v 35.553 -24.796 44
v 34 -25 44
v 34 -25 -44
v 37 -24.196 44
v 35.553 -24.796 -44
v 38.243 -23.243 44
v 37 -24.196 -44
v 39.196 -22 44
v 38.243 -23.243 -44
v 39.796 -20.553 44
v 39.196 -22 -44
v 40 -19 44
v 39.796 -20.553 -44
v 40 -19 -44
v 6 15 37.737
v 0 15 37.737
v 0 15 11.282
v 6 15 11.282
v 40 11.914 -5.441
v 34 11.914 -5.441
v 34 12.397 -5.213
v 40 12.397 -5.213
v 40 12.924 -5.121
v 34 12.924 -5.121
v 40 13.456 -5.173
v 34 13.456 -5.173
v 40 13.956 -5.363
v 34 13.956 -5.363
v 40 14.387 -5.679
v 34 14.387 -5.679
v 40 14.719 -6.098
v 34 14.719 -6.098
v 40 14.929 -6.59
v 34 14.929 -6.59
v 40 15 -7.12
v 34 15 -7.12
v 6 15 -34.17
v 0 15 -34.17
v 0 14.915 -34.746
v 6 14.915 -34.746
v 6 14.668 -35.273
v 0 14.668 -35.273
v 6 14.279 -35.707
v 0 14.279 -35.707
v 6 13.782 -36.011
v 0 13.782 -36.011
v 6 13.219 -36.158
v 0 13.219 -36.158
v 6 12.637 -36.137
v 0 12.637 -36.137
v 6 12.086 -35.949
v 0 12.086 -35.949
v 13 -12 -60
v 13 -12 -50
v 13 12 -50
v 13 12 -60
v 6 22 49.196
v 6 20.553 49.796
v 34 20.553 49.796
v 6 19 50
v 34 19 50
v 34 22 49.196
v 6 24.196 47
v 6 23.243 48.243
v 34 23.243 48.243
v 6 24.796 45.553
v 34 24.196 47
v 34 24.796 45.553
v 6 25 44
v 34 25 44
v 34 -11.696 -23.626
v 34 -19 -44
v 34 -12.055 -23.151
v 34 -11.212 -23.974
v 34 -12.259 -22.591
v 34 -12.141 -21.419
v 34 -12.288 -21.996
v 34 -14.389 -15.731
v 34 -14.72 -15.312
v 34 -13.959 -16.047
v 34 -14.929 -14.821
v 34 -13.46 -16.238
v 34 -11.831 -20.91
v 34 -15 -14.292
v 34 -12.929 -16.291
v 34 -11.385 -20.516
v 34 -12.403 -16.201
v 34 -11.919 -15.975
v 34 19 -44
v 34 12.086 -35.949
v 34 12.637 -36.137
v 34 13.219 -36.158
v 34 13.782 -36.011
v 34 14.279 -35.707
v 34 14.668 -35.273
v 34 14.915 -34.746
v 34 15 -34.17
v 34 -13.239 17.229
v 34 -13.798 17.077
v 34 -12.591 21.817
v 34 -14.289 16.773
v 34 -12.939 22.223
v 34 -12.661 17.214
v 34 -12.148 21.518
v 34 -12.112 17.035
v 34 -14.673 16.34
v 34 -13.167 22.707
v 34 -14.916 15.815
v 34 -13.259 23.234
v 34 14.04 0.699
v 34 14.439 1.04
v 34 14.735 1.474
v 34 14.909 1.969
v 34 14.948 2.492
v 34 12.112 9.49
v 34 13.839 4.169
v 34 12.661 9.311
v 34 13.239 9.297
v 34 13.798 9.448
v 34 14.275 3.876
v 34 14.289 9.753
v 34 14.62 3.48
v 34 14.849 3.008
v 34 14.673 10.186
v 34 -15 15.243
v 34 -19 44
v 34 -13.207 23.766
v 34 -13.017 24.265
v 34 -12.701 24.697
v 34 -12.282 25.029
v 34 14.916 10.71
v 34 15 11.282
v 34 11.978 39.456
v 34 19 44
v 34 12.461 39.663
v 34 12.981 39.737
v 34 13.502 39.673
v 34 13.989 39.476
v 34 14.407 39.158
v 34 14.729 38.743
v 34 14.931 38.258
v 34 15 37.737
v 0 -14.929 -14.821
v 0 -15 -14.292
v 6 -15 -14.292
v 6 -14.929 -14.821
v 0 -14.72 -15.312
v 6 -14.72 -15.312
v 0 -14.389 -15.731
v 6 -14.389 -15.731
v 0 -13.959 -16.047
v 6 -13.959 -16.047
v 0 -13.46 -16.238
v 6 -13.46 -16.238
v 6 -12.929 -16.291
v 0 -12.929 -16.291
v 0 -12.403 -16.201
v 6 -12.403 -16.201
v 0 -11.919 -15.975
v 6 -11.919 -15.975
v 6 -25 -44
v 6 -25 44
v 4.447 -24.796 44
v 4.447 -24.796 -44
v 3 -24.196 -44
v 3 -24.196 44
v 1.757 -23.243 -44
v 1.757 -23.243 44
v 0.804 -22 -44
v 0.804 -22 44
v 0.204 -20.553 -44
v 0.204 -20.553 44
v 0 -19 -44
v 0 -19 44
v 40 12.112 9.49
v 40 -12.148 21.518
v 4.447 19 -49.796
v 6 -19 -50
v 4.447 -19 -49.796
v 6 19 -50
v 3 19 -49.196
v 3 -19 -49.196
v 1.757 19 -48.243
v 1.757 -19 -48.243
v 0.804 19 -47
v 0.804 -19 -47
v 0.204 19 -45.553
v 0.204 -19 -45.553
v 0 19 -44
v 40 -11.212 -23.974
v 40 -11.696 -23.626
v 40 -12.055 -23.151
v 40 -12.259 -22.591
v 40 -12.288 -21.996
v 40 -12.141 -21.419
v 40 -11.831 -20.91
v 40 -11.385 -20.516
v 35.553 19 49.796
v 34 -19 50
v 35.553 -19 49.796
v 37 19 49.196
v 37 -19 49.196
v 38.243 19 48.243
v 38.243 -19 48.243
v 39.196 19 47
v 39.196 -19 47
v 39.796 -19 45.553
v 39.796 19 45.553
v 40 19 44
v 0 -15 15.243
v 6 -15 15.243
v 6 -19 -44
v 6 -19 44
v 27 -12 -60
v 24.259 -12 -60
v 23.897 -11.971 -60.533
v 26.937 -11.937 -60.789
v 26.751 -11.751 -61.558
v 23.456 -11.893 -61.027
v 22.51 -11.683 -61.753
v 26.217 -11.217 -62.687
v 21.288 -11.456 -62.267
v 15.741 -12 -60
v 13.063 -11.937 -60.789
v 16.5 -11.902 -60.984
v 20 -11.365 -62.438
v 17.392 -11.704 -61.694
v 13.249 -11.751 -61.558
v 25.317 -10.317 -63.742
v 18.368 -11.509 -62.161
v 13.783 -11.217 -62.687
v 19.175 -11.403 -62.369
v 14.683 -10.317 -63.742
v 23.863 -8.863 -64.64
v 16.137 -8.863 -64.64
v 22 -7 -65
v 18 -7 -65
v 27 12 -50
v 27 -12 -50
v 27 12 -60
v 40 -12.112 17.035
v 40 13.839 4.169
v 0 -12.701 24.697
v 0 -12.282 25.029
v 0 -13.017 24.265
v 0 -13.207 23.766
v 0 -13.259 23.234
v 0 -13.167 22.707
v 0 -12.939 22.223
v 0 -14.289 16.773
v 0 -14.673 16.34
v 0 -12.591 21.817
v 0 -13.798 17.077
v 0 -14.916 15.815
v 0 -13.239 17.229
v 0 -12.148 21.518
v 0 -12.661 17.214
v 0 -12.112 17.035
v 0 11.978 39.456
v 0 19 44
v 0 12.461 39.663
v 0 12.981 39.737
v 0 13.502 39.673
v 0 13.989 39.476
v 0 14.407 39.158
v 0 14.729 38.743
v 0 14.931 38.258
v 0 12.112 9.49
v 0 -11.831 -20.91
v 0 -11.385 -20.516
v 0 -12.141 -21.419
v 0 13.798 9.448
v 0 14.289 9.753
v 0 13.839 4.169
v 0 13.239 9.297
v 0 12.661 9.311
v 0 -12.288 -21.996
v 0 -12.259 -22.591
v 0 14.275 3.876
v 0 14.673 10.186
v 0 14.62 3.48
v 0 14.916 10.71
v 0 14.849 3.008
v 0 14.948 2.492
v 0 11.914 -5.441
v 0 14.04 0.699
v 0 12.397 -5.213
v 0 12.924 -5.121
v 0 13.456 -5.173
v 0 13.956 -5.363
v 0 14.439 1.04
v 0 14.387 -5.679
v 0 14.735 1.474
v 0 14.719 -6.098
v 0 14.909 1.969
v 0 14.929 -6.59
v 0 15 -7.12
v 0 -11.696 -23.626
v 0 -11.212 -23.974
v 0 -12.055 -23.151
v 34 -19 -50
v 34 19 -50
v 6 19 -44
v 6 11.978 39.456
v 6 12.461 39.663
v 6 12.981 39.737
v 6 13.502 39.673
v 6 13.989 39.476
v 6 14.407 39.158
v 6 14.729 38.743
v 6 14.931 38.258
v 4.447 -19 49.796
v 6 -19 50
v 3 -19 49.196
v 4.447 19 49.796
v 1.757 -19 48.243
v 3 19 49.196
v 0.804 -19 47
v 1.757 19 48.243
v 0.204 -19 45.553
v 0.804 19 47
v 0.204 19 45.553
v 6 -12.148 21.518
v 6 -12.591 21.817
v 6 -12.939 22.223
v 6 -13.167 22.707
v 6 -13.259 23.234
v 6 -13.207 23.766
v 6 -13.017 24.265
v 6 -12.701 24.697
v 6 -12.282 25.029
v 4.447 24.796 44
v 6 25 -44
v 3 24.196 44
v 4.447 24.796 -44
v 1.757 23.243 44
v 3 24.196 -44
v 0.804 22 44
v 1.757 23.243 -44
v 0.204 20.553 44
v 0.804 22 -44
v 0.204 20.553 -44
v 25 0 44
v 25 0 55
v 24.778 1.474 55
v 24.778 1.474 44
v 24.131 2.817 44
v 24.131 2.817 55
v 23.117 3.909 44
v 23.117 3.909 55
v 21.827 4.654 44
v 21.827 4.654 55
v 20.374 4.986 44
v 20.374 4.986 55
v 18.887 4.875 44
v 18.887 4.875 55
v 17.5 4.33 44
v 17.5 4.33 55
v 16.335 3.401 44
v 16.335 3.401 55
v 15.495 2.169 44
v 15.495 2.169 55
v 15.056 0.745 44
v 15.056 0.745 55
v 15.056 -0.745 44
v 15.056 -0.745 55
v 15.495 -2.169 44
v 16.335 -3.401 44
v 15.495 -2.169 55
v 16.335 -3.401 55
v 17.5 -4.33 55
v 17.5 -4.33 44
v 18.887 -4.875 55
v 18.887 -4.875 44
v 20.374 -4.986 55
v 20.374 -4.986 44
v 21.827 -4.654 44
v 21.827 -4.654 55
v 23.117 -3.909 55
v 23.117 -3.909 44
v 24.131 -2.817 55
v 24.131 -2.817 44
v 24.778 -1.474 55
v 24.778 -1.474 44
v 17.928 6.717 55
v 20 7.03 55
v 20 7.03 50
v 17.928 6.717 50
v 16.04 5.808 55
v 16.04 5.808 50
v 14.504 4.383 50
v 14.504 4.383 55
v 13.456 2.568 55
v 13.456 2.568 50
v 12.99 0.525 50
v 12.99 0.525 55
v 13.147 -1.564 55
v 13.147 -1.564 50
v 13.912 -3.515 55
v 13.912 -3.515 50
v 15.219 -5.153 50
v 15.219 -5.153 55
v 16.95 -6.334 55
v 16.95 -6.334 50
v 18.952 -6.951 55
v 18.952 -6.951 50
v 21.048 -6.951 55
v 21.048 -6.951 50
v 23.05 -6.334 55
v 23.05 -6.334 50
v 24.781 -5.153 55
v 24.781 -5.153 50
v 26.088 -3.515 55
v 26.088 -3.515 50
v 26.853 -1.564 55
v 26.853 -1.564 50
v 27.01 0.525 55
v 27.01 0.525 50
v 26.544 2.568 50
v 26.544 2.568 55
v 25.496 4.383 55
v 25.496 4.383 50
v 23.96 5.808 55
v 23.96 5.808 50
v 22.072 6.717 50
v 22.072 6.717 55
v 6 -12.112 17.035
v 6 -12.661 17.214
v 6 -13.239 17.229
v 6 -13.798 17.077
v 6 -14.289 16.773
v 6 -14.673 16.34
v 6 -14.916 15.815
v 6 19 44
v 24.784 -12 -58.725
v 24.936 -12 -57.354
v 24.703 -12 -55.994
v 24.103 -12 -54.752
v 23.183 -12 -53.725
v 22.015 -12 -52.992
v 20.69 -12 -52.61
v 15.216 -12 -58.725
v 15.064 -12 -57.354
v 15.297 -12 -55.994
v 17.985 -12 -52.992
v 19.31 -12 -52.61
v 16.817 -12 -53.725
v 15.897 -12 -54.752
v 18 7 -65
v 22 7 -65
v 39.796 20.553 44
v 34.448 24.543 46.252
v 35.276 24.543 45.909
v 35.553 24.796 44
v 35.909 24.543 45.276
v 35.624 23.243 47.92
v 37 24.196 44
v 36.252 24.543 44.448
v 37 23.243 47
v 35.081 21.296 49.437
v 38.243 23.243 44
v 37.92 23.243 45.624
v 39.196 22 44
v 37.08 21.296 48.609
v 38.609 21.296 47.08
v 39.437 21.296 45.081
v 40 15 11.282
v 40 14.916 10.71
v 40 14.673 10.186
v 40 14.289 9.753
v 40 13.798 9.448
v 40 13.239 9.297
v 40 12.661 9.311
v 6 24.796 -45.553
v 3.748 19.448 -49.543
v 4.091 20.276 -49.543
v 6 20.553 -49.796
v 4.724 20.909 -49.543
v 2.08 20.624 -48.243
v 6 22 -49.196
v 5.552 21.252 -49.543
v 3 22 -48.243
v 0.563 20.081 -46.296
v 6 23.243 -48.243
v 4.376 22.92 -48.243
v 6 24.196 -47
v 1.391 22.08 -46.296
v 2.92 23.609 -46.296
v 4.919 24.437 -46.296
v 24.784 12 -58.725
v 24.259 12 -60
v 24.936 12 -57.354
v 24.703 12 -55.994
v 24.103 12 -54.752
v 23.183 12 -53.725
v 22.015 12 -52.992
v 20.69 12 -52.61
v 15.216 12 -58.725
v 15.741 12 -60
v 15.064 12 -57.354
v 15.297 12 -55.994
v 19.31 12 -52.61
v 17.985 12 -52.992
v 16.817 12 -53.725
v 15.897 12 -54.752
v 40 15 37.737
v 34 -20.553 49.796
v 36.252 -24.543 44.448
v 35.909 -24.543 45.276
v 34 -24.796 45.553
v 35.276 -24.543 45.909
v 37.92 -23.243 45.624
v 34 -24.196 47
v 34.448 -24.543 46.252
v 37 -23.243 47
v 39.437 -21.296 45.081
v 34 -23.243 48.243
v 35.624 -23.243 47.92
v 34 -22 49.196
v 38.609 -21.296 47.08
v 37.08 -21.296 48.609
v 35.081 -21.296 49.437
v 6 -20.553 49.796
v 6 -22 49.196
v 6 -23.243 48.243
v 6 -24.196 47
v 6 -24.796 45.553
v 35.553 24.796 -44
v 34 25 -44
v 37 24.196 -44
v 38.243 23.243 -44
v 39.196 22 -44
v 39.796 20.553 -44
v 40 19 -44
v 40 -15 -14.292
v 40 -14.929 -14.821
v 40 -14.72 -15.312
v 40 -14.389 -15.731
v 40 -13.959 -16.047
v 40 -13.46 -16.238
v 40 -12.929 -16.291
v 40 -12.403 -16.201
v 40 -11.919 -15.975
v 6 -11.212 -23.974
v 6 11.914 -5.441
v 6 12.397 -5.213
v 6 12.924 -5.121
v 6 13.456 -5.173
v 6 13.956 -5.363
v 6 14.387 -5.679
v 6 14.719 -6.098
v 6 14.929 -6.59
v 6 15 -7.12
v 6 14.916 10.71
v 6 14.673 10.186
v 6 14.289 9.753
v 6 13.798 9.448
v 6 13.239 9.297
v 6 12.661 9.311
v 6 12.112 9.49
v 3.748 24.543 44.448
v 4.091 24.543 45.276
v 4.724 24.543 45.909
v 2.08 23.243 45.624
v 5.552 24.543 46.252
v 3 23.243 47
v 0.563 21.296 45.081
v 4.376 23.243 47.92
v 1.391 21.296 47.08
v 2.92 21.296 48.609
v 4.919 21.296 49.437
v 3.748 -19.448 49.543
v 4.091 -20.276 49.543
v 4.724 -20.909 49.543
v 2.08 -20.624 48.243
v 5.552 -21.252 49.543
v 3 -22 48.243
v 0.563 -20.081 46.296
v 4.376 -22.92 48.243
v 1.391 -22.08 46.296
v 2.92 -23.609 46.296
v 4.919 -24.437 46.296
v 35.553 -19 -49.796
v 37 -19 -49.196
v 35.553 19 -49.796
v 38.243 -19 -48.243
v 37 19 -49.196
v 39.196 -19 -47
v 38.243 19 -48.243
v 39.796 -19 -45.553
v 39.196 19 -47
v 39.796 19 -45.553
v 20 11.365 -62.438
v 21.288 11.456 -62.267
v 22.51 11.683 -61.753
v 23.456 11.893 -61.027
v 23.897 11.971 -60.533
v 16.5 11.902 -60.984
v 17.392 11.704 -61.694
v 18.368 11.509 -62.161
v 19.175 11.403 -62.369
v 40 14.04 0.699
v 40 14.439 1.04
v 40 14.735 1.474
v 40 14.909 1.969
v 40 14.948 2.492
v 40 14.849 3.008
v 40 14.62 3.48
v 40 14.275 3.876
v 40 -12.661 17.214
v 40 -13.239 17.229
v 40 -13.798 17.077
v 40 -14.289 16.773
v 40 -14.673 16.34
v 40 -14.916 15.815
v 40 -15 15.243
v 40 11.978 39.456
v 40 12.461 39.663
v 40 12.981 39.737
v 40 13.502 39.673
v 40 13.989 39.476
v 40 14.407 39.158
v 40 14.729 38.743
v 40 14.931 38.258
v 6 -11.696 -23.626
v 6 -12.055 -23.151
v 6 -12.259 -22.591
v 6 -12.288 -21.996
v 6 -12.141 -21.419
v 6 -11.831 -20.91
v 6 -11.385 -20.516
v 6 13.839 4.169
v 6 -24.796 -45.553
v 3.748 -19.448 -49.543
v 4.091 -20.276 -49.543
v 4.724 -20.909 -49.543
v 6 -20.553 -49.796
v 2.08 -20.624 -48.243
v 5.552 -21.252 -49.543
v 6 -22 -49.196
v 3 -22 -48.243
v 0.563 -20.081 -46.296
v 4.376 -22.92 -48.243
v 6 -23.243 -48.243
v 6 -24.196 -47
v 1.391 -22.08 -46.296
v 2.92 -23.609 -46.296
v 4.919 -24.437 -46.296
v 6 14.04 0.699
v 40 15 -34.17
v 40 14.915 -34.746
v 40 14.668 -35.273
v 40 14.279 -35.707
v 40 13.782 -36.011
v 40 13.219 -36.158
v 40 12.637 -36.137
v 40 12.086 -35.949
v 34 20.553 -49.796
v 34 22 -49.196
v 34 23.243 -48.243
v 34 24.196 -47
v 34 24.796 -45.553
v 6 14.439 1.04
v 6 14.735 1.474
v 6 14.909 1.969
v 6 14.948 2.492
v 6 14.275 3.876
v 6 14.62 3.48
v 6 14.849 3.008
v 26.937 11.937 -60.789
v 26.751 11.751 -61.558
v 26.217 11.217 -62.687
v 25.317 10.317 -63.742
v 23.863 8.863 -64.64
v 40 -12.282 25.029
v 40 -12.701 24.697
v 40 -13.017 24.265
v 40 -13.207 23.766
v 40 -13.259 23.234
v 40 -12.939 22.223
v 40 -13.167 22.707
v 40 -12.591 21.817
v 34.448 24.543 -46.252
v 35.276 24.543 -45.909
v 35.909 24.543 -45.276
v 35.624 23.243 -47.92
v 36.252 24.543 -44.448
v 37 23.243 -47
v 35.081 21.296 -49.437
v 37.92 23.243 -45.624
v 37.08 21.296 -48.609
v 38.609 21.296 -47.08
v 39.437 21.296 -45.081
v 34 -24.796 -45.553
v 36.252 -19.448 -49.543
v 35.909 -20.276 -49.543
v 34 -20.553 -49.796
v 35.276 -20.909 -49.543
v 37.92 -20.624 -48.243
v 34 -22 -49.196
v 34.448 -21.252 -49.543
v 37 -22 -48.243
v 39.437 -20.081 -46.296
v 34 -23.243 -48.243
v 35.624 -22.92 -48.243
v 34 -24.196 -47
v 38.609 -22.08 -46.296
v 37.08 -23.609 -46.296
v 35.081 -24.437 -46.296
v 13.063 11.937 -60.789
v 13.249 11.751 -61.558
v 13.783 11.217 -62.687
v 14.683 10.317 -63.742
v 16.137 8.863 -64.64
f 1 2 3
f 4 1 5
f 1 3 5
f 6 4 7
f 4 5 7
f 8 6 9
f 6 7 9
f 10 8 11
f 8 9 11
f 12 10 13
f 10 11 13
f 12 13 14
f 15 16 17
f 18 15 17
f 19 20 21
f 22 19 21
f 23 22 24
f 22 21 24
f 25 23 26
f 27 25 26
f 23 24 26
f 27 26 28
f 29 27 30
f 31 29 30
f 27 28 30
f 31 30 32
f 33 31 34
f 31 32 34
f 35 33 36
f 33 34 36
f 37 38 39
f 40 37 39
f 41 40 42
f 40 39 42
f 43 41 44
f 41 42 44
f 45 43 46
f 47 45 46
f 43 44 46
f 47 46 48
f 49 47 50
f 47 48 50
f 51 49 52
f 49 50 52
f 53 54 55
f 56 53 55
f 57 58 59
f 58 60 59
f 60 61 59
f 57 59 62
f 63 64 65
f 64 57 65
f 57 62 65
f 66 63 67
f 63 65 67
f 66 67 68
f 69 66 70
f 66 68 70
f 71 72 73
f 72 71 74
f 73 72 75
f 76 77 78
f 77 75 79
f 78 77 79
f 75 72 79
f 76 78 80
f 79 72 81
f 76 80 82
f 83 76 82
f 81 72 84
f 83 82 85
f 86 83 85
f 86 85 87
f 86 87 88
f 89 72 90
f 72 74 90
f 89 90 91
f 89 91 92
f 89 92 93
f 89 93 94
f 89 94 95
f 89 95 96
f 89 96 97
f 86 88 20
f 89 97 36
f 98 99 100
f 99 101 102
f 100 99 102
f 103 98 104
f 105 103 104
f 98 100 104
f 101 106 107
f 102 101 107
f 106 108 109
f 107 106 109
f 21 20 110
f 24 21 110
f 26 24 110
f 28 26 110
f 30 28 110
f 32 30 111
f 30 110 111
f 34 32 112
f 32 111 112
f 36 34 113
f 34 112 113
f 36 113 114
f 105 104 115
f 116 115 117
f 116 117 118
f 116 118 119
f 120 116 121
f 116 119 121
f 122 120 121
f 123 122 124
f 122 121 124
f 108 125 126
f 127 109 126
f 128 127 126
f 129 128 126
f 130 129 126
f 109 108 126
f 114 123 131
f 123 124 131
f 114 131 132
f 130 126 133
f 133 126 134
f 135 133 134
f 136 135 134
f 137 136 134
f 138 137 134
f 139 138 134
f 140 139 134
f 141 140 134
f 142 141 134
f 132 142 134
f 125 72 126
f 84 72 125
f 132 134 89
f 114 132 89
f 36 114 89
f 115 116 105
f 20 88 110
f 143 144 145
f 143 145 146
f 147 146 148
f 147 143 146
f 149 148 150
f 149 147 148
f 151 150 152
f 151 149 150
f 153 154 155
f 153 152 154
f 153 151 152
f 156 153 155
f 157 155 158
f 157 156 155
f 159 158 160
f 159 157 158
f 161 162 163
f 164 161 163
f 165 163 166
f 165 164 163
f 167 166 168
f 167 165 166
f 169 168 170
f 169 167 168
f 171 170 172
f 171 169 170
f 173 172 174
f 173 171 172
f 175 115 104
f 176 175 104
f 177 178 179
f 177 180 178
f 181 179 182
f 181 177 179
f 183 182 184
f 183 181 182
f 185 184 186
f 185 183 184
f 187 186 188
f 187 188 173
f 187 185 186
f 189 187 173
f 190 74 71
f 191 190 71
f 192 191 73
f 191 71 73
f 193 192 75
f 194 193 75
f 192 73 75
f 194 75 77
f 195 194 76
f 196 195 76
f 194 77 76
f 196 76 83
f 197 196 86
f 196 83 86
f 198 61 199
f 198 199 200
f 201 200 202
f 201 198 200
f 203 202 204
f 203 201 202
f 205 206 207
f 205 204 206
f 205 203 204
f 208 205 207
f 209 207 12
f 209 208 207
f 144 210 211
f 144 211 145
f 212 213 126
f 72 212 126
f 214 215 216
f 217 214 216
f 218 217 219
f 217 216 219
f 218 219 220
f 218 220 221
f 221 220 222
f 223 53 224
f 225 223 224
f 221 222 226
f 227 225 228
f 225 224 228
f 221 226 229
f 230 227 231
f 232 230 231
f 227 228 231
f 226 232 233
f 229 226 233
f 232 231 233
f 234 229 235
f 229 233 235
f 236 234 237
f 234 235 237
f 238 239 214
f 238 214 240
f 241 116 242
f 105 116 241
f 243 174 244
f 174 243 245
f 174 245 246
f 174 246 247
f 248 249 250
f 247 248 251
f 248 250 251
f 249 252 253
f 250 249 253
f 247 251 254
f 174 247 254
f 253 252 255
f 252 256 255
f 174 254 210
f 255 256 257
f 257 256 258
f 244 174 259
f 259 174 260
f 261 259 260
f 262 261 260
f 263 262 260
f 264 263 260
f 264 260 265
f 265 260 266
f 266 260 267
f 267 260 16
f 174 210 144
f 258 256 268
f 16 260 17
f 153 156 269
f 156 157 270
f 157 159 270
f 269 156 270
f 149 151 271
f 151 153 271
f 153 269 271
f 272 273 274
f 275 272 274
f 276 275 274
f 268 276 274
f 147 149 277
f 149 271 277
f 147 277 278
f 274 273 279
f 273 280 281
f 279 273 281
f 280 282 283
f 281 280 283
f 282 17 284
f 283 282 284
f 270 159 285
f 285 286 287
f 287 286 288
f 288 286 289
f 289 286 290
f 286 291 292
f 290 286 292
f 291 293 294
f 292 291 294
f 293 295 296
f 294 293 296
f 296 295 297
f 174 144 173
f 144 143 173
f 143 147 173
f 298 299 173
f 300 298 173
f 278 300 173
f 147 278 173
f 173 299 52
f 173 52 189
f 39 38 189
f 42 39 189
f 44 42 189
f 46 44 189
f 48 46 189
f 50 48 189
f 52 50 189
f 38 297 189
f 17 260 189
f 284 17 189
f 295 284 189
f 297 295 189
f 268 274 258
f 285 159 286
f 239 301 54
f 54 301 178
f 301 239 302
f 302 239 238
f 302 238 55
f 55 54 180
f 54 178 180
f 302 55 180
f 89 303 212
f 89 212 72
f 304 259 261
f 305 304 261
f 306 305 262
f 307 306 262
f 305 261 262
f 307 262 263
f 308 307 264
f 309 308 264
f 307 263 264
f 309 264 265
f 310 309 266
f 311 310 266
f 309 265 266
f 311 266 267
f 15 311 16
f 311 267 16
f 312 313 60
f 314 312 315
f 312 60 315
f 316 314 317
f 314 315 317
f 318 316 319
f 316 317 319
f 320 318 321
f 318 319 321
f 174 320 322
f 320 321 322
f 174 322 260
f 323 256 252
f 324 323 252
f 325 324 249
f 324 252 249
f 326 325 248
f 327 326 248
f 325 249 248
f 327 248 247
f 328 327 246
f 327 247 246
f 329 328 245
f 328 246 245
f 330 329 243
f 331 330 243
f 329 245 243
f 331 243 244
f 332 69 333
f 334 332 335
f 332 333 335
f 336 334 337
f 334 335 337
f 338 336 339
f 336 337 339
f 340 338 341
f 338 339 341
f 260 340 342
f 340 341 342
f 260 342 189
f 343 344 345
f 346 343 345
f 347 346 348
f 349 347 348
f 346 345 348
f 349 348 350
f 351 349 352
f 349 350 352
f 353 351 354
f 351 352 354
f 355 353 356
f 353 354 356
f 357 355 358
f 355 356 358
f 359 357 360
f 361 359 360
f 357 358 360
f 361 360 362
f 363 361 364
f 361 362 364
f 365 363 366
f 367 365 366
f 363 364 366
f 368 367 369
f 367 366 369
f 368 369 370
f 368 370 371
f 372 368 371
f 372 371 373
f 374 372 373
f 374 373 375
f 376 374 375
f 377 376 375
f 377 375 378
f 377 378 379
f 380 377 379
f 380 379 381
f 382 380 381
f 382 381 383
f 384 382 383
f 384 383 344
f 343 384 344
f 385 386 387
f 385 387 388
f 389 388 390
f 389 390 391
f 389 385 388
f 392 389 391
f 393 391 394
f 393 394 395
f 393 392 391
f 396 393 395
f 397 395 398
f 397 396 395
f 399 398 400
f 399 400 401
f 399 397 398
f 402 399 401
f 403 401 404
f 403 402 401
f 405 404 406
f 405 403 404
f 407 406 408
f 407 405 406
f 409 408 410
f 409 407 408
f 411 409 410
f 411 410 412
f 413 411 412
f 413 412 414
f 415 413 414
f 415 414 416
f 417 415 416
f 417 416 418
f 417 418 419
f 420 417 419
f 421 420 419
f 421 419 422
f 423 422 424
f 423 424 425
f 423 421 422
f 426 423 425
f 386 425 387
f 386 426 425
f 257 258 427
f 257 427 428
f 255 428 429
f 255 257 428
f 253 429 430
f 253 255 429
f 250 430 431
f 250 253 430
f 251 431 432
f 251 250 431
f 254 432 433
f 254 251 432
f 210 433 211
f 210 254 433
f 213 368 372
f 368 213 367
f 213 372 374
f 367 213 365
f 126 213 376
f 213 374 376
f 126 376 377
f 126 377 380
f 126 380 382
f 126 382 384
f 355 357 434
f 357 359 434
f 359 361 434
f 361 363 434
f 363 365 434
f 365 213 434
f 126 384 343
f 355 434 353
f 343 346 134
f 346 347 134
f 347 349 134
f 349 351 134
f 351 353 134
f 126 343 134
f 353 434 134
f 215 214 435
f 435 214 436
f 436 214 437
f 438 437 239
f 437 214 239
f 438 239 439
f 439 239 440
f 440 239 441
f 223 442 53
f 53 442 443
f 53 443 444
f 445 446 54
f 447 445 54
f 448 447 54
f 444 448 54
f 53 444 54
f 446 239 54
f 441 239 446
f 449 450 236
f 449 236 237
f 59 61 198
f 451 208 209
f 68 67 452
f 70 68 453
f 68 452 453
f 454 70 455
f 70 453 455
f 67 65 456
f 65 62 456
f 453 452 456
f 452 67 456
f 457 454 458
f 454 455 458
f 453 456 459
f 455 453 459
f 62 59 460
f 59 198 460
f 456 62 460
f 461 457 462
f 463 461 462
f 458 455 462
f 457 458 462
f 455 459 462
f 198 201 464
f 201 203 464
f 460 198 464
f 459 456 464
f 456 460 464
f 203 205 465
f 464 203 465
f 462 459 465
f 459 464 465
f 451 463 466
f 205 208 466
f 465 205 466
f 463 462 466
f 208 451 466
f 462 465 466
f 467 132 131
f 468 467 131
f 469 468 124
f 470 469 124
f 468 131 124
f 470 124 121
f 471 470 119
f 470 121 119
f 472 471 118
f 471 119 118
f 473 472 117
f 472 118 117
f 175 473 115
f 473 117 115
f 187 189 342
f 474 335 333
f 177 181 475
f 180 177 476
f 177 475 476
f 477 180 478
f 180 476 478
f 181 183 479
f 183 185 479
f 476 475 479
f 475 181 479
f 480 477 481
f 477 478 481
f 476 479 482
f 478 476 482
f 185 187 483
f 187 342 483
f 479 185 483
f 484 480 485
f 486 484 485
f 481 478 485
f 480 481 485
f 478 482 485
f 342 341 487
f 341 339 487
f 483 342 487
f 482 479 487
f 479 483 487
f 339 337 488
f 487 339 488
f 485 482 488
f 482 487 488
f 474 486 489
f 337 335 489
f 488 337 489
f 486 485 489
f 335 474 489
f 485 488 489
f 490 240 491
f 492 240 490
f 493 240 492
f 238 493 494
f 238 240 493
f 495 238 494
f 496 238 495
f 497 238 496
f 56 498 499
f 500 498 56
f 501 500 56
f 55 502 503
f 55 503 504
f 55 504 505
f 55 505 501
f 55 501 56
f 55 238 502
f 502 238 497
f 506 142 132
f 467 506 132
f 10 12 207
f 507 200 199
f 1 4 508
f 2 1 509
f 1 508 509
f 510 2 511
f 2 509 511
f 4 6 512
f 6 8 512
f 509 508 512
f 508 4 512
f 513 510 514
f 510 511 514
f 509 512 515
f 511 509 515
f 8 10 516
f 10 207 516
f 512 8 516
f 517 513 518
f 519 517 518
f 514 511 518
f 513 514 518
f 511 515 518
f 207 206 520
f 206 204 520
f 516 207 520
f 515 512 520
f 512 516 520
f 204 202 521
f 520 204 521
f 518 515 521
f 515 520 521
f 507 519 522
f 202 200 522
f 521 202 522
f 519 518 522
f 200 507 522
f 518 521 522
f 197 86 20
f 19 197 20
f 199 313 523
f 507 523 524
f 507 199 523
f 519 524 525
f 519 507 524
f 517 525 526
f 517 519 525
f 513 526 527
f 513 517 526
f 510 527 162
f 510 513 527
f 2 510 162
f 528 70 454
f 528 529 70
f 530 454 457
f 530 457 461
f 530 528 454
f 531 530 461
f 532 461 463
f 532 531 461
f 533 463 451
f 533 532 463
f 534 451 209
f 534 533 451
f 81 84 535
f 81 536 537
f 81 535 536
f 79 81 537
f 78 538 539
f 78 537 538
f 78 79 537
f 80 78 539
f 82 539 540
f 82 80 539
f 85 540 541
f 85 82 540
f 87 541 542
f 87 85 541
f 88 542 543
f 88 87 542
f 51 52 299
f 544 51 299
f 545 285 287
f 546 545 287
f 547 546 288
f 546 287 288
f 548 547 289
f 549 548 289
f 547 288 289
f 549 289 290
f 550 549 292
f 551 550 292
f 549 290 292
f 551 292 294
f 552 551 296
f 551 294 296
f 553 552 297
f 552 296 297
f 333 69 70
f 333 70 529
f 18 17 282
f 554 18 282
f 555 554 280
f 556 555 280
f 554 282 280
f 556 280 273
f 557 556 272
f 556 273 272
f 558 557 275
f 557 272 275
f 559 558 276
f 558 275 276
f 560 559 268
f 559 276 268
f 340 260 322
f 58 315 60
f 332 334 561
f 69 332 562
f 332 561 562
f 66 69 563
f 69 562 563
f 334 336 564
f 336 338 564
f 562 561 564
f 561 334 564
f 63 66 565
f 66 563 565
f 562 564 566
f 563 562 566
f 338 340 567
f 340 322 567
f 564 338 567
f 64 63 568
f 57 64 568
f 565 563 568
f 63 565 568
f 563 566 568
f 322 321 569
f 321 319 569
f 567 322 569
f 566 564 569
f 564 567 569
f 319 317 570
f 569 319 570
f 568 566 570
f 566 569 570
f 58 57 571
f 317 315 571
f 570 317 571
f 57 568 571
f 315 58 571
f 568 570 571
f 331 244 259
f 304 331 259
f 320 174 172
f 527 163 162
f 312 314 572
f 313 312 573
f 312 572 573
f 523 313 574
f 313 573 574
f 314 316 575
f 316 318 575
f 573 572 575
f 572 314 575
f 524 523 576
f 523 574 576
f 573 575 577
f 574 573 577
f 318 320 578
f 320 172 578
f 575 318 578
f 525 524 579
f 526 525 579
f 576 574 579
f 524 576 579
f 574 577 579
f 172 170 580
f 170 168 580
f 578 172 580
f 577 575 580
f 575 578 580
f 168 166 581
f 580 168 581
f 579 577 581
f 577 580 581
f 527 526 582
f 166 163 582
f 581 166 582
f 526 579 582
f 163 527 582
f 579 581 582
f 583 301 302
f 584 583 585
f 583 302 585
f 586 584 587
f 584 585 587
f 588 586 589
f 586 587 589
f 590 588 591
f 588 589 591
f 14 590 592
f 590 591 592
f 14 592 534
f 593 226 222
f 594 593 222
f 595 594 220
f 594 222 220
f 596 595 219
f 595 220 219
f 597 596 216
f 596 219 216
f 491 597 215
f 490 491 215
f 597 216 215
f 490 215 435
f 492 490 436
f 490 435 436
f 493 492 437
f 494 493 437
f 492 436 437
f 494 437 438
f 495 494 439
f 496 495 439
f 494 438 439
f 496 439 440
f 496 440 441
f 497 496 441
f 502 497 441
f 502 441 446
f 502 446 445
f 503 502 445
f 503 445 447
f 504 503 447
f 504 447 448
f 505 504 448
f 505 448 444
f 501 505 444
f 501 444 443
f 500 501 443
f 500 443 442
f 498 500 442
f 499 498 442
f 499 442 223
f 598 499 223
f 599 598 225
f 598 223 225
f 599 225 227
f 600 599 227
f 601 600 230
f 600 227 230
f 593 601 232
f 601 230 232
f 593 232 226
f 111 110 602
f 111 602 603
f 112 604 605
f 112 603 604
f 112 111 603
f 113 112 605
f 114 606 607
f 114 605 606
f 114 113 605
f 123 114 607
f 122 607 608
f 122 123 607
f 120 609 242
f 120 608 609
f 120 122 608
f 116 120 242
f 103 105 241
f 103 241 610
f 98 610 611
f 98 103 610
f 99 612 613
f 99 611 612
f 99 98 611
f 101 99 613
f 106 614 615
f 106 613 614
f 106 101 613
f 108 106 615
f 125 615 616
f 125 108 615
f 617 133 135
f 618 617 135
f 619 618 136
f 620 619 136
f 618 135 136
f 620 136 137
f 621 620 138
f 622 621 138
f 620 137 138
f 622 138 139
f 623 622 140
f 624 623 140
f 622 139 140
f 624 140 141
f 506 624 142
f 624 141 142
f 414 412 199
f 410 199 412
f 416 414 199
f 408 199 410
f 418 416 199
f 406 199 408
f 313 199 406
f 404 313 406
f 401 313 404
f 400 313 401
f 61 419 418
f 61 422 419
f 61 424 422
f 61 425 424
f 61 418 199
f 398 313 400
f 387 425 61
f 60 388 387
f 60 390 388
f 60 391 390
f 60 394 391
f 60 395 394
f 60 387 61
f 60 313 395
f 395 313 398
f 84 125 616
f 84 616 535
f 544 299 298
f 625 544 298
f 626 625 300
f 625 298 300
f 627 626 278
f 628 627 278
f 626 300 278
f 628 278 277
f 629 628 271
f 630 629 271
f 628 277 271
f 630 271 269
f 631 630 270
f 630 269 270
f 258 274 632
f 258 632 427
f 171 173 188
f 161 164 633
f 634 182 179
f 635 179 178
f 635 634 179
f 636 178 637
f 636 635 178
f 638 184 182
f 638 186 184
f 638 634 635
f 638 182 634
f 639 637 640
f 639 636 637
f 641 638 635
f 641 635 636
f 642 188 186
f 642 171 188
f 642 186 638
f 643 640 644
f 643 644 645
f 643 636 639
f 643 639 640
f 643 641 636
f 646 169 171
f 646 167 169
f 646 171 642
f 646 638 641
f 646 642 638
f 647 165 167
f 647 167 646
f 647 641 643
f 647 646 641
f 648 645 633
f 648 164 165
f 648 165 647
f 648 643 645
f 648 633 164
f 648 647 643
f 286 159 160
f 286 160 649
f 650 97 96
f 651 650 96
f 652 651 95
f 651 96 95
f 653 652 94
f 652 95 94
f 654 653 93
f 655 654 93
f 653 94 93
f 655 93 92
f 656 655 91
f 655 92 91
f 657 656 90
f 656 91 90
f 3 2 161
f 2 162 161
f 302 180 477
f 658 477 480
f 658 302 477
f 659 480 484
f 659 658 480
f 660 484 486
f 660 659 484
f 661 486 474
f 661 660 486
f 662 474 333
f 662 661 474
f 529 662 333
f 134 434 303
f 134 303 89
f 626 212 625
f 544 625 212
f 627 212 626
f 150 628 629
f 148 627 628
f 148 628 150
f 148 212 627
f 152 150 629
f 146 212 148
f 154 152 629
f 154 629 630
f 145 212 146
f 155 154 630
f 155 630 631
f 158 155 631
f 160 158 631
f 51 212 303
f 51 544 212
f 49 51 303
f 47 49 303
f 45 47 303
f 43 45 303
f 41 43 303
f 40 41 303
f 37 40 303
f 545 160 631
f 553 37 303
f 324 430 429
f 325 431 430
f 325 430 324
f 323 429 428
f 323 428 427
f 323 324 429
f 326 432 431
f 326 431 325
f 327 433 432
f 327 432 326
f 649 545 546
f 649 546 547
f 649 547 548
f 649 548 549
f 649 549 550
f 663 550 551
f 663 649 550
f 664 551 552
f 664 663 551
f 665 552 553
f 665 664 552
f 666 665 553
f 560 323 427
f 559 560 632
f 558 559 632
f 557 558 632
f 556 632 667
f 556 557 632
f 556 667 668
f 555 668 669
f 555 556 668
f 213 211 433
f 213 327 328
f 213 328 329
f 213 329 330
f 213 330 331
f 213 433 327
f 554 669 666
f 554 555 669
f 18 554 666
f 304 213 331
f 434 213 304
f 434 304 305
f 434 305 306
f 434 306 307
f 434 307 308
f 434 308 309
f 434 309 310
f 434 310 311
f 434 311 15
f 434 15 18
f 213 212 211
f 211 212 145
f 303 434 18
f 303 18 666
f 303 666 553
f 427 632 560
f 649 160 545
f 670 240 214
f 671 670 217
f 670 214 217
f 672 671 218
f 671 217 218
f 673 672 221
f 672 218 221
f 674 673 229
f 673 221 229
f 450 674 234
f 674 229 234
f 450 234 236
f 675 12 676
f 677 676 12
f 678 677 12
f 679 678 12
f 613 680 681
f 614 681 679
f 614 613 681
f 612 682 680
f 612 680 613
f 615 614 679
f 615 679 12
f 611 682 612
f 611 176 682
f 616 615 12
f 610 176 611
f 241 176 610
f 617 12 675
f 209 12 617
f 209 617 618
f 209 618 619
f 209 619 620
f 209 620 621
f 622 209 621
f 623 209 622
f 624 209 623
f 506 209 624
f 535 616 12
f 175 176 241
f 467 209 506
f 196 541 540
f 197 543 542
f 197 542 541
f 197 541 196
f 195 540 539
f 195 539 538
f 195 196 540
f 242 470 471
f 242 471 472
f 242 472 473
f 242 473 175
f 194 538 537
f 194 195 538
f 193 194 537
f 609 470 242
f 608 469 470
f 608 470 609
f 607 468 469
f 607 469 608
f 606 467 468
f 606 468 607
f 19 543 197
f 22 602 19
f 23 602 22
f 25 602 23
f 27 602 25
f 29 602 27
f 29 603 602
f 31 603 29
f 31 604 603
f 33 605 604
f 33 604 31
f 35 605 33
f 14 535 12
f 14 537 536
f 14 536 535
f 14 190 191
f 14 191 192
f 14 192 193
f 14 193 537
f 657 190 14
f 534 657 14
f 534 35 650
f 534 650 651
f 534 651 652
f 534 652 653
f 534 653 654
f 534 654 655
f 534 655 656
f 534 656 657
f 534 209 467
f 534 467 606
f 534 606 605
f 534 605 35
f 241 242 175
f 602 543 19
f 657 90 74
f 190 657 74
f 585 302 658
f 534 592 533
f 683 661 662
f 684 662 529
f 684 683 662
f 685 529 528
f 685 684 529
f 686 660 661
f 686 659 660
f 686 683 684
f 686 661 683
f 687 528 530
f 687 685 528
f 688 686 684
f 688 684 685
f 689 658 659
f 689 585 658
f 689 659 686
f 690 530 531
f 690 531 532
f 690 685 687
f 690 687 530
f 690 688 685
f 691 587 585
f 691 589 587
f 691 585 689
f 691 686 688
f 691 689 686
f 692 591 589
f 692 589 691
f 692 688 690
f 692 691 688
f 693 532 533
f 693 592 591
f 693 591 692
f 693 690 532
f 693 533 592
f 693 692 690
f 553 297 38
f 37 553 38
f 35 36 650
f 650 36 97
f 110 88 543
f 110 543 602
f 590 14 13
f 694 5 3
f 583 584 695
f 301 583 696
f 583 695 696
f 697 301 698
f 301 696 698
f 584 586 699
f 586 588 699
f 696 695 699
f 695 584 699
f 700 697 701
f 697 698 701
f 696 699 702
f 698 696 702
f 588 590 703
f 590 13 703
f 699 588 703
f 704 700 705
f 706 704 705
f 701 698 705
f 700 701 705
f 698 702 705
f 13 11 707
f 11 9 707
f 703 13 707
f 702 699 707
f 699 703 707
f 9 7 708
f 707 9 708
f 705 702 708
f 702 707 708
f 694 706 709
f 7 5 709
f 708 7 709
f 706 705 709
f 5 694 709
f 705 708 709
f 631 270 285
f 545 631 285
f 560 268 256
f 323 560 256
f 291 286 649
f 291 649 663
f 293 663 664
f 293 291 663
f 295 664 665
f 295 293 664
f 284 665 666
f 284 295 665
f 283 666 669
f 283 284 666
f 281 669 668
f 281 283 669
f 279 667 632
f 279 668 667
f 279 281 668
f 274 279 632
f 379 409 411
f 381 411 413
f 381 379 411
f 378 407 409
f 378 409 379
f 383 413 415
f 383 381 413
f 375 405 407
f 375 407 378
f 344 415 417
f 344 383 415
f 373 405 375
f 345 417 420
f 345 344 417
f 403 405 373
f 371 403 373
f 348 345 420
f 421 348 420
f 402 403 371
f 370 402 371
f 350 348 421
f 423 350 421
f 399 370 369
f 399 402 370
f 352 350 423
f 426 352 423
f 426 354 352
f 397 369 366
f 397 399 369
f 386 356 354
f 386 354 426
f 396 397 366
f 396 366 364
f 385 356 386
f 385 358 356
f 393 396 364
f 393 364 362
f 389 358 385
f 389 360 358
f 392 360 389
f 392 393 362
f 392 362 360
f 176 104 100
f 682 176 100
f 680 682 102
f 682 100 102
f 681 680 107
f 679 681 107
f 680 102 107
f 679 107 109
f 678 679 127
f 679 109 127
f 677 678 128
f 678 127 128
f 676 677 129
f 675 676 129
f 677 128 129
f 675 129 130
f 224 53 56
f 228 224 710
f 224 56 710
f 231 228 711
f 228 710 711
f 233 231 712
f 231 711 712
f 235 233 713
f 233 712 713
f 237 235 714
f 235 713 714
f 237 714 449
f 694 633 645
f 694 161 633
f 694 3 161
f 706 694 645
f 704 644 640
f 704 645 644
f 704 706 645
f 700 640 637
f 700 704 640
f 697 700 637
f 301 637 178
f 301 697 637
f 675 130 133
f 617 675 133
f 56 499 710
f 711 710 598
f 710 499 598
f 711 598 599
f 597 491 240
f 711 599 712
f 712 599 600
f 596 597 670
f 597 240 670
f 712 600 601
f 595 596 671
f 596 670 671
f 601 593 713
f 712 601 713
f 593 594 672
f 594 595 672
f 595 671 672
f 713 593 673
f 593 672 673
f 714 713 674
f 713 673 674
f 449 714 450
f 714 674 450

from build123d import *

# Parameters (mm, degrees)
SKETCH1_W           = 100
SKETCH1_H           = 50
BOSS_EXTRUDE1_DEPTH = 40
FILLET1_R           = 6
SKETCH4_R           = 5
CUT_EXTRUDE2_DEPTH  = 8
CUT_EXTRUDE4_DEPTH  = 69.738635424
SKETCH29_W          = 14
SKETCH29_H          = 24
BOSS_EXTRUDE2_DEPTH = 15
SKETCH31_R          = 4.938293982
CUT_EXTRUDE6_DEPTH  = 85.817451035
FILLET7_R           = 5
SKETCH32_W          = 28
SKETCH32_H          = 38
CUT_EXTRUDE7_DEPTH  = 88
BOSS_EXTRUDE3_START = 5
SKETCH33_R          = 7.029692419
SKETCH33_R_2        = 5
BOSS_EXTRUDE3_DEPTH = 5


with BuildPart() as part:
    # Sketch1 → Boss-Extrude1 (new body)
    with BuildSketch(Plane(origin=(0, 0, 0), x_dir=(0, 0, -1), z_dir=(1, 0, 0))):
        Rectangle(SKETCH1_W, SKETCH1_H)
    extrude(amount=BOSS_EXTRUDE1_DEPTH)

    # Fillet1
    fillet1_edges = [part.edges().sort_by_distance(p)[0] for p in [
        (40, 0, 50),
        (40, -25, 0),
        (40, 0, -50),
        (0, -25, 0),
        (0, 0, 50),
        (0, 25, 0),
        (0, 0, -50),
        (20, -25, -50),
        (20, -25, 50),
        (20, 25, 50),
        (20, 25, -50),
        (40, 25, 0),
    ]]
    fillet(fillet1_edges, radius=FILLET1_R)

    # Sketch4 → Cut-Extrude2 (cut)
    with BuildSketch(Plane.XY.offset(50)):
        with Locations((20, 0)):
            Circle(SKETCH4_R)
    extrude(amount=-CUT_EXTRUDE2_DEPTH, mode=Mode.SUBTRACT)

    # Sketch27 → Cut-Extrude4 (cut, through all)
    with BuildSketch(Plane.ZY):
        with BuildLine():
            Line((-35.948740213, 12.085727651), (-23.973812043, -11.212498079))
            ThreePointArc((-23.973812043, -11.212498079), (-22.294505165, -12.295749804), (-20.515873253, -11.384720489))
            Line((-20.515873253, -11.384720489), (-5.440704193, 11.91350524))
            ThreePointArc((-5.440704193, 11.91350524), (-5.363007282, 13.955774681), (-7.119849552, 15))
            Line((-7.119849552, 15), (-34.169946782, 15))
            ThreePointArc((-34.169946782, 15), (-35.877070781, 14.041982558), (-35.948740213, 12.085727651))
        make_face()
        with BuildLine():
            Line((4.169016264, 13.839458065), (17.035163046, -12.111620565))
            ThreePointArc((17.035163046, -12.111620565), (16.94282084, -14.054334181), (15.243297544, -15))
            Line((15.243297544, -15), (-14.291999001, -15))
            ThreePointArc((-14.291999001, -15), (-16.047244937, -13.958703137), (-15.974758786, -11.919111705))
            Line((-15.974758786, -11.919111705), (0.699377924, 14.039691649))
            ThreePointArc((0.699377924, 14.039691649), (2.492379474, 14.947756457), (4.169016264, 13.839458065))
        make_face()
        with BuildLine():
            Line((9.490272401, 12.111620565), (21.518065714, -12.148495172))
            ThreePointArc((21.518065714, -12.148495172), (23.233716027, -13.258663021), (25.028933638, -12.282383156))
            Line((25.028933638, -12.282383156), (39.456095343, 11.977732581))
            ThreePointArc((39.456095343, 11.977732581), (39.475559896, 13.988803611), (37.737092922, 15))
            Line((37.737092922, 15), (11.282137904, 15))
            ThreePointArc((11.282137904, 15), (9.582614607, 14.054334181), (9.490272401, 12.111620565))
        make_face()
    extrude(amount=-CUT_EXTRUDE4_DEPTH, mode=Mode.SUBTRACT)

    # Sketch29 → Boss-Extrude2 (add)
    with BuildSketch(Plane(origin=(0, 0, -50), x_dir=(-1, 0, 0), z_dir=(0, 0, -1))):
        with Locations((-20, 0)):
            Rectangle(SKETCH29_W, SKETCH29_H)
    extrude(amount=BOSS_EXTRUDE2_DEPTH)

    # Sketch31 → Cut-Extrude6 (cut, through all)
    with BuildSketch(Plane.XZ.offset(12)):
        with Locations(Location((20, -57.5, 0), (0, 0, 270))):
            Circle(SKETCH31_R)
    extrude(amount=-CUT_EXTRUDE6_DEPTH, mode=Mode.SUBTRACT)

    # Fillet7
    # the kernel refuses this fillet: 5 mm, written as the material it takes off along each edge
    with BuildSketch(Plane(origin=(13, 24.5, -65), x_dir=(0, 0, 1), z_dir=(0, -1, 0)), Plane(origin=(27, -24.5, -65), x_dir=(0, 0, 1), z_dir=(0, 1, 0))) as fillet7_piece_1:
        with BuildLine():
            CenterArc((FILLET7_R, -FILLET7_R), FILLET7_R, 90, 90)
            Line((0, -FILLET7_R), (0, 0))
            Line((0, 0), (FILLET7_R, 0))
        make_face()
    extrude(amount=49, mode=Mode.SUBTRACT)
    with BuildSketch(Plane(origin=(39.5, 12, -65), x_dir=(0, 0, 1), z_dir=(-1, 0, 0)), Plane(origin=(0.5, -12, -65), x_dir=(0, 0, 1), z_dir=(1, 0, 0))) as fillet7_piece_2:
        with BuildLine():
            CenterArc((FILLET7_R, -FILLET7_R), FILLET7_R, 90, 90)
            Line((0, -FILLET7_R), (0, 0))
            Line((0, 0), (FILLET7_R, 0))
        make_face()
    extrude(amount=39, mode=Mode.SUBTRACT)

    # Sketch32 → Cut-Extrude7 (cut)
    with BuildSketch(Plane.XY.offset(44)):
        with Locations((20, 0)):
            Rectangle(SKETCH32_W, SKETCH32_H)
    extrude(amount=-CUT_EXTRUDE7_DEPTH, mode=Mode.SUBTRACT)

    # Sketch33 → Boss-Extrude3 (add)
    with BuildSketch(Plane.XY.offset(50).offset(BOSS_EXTRUDE3_START)):
        with Locations(Location((20, 0, 0), (0, 0, 90))):
            Circle(SKETCH33_R)
        with Locations((20, 0)):
            Circle(SKETCH33_R_2, mode=Mode.SUBTRACT)
    extrude(amount=-BOSS_EXTRUDE3_DEPTH)


solid = part.part
